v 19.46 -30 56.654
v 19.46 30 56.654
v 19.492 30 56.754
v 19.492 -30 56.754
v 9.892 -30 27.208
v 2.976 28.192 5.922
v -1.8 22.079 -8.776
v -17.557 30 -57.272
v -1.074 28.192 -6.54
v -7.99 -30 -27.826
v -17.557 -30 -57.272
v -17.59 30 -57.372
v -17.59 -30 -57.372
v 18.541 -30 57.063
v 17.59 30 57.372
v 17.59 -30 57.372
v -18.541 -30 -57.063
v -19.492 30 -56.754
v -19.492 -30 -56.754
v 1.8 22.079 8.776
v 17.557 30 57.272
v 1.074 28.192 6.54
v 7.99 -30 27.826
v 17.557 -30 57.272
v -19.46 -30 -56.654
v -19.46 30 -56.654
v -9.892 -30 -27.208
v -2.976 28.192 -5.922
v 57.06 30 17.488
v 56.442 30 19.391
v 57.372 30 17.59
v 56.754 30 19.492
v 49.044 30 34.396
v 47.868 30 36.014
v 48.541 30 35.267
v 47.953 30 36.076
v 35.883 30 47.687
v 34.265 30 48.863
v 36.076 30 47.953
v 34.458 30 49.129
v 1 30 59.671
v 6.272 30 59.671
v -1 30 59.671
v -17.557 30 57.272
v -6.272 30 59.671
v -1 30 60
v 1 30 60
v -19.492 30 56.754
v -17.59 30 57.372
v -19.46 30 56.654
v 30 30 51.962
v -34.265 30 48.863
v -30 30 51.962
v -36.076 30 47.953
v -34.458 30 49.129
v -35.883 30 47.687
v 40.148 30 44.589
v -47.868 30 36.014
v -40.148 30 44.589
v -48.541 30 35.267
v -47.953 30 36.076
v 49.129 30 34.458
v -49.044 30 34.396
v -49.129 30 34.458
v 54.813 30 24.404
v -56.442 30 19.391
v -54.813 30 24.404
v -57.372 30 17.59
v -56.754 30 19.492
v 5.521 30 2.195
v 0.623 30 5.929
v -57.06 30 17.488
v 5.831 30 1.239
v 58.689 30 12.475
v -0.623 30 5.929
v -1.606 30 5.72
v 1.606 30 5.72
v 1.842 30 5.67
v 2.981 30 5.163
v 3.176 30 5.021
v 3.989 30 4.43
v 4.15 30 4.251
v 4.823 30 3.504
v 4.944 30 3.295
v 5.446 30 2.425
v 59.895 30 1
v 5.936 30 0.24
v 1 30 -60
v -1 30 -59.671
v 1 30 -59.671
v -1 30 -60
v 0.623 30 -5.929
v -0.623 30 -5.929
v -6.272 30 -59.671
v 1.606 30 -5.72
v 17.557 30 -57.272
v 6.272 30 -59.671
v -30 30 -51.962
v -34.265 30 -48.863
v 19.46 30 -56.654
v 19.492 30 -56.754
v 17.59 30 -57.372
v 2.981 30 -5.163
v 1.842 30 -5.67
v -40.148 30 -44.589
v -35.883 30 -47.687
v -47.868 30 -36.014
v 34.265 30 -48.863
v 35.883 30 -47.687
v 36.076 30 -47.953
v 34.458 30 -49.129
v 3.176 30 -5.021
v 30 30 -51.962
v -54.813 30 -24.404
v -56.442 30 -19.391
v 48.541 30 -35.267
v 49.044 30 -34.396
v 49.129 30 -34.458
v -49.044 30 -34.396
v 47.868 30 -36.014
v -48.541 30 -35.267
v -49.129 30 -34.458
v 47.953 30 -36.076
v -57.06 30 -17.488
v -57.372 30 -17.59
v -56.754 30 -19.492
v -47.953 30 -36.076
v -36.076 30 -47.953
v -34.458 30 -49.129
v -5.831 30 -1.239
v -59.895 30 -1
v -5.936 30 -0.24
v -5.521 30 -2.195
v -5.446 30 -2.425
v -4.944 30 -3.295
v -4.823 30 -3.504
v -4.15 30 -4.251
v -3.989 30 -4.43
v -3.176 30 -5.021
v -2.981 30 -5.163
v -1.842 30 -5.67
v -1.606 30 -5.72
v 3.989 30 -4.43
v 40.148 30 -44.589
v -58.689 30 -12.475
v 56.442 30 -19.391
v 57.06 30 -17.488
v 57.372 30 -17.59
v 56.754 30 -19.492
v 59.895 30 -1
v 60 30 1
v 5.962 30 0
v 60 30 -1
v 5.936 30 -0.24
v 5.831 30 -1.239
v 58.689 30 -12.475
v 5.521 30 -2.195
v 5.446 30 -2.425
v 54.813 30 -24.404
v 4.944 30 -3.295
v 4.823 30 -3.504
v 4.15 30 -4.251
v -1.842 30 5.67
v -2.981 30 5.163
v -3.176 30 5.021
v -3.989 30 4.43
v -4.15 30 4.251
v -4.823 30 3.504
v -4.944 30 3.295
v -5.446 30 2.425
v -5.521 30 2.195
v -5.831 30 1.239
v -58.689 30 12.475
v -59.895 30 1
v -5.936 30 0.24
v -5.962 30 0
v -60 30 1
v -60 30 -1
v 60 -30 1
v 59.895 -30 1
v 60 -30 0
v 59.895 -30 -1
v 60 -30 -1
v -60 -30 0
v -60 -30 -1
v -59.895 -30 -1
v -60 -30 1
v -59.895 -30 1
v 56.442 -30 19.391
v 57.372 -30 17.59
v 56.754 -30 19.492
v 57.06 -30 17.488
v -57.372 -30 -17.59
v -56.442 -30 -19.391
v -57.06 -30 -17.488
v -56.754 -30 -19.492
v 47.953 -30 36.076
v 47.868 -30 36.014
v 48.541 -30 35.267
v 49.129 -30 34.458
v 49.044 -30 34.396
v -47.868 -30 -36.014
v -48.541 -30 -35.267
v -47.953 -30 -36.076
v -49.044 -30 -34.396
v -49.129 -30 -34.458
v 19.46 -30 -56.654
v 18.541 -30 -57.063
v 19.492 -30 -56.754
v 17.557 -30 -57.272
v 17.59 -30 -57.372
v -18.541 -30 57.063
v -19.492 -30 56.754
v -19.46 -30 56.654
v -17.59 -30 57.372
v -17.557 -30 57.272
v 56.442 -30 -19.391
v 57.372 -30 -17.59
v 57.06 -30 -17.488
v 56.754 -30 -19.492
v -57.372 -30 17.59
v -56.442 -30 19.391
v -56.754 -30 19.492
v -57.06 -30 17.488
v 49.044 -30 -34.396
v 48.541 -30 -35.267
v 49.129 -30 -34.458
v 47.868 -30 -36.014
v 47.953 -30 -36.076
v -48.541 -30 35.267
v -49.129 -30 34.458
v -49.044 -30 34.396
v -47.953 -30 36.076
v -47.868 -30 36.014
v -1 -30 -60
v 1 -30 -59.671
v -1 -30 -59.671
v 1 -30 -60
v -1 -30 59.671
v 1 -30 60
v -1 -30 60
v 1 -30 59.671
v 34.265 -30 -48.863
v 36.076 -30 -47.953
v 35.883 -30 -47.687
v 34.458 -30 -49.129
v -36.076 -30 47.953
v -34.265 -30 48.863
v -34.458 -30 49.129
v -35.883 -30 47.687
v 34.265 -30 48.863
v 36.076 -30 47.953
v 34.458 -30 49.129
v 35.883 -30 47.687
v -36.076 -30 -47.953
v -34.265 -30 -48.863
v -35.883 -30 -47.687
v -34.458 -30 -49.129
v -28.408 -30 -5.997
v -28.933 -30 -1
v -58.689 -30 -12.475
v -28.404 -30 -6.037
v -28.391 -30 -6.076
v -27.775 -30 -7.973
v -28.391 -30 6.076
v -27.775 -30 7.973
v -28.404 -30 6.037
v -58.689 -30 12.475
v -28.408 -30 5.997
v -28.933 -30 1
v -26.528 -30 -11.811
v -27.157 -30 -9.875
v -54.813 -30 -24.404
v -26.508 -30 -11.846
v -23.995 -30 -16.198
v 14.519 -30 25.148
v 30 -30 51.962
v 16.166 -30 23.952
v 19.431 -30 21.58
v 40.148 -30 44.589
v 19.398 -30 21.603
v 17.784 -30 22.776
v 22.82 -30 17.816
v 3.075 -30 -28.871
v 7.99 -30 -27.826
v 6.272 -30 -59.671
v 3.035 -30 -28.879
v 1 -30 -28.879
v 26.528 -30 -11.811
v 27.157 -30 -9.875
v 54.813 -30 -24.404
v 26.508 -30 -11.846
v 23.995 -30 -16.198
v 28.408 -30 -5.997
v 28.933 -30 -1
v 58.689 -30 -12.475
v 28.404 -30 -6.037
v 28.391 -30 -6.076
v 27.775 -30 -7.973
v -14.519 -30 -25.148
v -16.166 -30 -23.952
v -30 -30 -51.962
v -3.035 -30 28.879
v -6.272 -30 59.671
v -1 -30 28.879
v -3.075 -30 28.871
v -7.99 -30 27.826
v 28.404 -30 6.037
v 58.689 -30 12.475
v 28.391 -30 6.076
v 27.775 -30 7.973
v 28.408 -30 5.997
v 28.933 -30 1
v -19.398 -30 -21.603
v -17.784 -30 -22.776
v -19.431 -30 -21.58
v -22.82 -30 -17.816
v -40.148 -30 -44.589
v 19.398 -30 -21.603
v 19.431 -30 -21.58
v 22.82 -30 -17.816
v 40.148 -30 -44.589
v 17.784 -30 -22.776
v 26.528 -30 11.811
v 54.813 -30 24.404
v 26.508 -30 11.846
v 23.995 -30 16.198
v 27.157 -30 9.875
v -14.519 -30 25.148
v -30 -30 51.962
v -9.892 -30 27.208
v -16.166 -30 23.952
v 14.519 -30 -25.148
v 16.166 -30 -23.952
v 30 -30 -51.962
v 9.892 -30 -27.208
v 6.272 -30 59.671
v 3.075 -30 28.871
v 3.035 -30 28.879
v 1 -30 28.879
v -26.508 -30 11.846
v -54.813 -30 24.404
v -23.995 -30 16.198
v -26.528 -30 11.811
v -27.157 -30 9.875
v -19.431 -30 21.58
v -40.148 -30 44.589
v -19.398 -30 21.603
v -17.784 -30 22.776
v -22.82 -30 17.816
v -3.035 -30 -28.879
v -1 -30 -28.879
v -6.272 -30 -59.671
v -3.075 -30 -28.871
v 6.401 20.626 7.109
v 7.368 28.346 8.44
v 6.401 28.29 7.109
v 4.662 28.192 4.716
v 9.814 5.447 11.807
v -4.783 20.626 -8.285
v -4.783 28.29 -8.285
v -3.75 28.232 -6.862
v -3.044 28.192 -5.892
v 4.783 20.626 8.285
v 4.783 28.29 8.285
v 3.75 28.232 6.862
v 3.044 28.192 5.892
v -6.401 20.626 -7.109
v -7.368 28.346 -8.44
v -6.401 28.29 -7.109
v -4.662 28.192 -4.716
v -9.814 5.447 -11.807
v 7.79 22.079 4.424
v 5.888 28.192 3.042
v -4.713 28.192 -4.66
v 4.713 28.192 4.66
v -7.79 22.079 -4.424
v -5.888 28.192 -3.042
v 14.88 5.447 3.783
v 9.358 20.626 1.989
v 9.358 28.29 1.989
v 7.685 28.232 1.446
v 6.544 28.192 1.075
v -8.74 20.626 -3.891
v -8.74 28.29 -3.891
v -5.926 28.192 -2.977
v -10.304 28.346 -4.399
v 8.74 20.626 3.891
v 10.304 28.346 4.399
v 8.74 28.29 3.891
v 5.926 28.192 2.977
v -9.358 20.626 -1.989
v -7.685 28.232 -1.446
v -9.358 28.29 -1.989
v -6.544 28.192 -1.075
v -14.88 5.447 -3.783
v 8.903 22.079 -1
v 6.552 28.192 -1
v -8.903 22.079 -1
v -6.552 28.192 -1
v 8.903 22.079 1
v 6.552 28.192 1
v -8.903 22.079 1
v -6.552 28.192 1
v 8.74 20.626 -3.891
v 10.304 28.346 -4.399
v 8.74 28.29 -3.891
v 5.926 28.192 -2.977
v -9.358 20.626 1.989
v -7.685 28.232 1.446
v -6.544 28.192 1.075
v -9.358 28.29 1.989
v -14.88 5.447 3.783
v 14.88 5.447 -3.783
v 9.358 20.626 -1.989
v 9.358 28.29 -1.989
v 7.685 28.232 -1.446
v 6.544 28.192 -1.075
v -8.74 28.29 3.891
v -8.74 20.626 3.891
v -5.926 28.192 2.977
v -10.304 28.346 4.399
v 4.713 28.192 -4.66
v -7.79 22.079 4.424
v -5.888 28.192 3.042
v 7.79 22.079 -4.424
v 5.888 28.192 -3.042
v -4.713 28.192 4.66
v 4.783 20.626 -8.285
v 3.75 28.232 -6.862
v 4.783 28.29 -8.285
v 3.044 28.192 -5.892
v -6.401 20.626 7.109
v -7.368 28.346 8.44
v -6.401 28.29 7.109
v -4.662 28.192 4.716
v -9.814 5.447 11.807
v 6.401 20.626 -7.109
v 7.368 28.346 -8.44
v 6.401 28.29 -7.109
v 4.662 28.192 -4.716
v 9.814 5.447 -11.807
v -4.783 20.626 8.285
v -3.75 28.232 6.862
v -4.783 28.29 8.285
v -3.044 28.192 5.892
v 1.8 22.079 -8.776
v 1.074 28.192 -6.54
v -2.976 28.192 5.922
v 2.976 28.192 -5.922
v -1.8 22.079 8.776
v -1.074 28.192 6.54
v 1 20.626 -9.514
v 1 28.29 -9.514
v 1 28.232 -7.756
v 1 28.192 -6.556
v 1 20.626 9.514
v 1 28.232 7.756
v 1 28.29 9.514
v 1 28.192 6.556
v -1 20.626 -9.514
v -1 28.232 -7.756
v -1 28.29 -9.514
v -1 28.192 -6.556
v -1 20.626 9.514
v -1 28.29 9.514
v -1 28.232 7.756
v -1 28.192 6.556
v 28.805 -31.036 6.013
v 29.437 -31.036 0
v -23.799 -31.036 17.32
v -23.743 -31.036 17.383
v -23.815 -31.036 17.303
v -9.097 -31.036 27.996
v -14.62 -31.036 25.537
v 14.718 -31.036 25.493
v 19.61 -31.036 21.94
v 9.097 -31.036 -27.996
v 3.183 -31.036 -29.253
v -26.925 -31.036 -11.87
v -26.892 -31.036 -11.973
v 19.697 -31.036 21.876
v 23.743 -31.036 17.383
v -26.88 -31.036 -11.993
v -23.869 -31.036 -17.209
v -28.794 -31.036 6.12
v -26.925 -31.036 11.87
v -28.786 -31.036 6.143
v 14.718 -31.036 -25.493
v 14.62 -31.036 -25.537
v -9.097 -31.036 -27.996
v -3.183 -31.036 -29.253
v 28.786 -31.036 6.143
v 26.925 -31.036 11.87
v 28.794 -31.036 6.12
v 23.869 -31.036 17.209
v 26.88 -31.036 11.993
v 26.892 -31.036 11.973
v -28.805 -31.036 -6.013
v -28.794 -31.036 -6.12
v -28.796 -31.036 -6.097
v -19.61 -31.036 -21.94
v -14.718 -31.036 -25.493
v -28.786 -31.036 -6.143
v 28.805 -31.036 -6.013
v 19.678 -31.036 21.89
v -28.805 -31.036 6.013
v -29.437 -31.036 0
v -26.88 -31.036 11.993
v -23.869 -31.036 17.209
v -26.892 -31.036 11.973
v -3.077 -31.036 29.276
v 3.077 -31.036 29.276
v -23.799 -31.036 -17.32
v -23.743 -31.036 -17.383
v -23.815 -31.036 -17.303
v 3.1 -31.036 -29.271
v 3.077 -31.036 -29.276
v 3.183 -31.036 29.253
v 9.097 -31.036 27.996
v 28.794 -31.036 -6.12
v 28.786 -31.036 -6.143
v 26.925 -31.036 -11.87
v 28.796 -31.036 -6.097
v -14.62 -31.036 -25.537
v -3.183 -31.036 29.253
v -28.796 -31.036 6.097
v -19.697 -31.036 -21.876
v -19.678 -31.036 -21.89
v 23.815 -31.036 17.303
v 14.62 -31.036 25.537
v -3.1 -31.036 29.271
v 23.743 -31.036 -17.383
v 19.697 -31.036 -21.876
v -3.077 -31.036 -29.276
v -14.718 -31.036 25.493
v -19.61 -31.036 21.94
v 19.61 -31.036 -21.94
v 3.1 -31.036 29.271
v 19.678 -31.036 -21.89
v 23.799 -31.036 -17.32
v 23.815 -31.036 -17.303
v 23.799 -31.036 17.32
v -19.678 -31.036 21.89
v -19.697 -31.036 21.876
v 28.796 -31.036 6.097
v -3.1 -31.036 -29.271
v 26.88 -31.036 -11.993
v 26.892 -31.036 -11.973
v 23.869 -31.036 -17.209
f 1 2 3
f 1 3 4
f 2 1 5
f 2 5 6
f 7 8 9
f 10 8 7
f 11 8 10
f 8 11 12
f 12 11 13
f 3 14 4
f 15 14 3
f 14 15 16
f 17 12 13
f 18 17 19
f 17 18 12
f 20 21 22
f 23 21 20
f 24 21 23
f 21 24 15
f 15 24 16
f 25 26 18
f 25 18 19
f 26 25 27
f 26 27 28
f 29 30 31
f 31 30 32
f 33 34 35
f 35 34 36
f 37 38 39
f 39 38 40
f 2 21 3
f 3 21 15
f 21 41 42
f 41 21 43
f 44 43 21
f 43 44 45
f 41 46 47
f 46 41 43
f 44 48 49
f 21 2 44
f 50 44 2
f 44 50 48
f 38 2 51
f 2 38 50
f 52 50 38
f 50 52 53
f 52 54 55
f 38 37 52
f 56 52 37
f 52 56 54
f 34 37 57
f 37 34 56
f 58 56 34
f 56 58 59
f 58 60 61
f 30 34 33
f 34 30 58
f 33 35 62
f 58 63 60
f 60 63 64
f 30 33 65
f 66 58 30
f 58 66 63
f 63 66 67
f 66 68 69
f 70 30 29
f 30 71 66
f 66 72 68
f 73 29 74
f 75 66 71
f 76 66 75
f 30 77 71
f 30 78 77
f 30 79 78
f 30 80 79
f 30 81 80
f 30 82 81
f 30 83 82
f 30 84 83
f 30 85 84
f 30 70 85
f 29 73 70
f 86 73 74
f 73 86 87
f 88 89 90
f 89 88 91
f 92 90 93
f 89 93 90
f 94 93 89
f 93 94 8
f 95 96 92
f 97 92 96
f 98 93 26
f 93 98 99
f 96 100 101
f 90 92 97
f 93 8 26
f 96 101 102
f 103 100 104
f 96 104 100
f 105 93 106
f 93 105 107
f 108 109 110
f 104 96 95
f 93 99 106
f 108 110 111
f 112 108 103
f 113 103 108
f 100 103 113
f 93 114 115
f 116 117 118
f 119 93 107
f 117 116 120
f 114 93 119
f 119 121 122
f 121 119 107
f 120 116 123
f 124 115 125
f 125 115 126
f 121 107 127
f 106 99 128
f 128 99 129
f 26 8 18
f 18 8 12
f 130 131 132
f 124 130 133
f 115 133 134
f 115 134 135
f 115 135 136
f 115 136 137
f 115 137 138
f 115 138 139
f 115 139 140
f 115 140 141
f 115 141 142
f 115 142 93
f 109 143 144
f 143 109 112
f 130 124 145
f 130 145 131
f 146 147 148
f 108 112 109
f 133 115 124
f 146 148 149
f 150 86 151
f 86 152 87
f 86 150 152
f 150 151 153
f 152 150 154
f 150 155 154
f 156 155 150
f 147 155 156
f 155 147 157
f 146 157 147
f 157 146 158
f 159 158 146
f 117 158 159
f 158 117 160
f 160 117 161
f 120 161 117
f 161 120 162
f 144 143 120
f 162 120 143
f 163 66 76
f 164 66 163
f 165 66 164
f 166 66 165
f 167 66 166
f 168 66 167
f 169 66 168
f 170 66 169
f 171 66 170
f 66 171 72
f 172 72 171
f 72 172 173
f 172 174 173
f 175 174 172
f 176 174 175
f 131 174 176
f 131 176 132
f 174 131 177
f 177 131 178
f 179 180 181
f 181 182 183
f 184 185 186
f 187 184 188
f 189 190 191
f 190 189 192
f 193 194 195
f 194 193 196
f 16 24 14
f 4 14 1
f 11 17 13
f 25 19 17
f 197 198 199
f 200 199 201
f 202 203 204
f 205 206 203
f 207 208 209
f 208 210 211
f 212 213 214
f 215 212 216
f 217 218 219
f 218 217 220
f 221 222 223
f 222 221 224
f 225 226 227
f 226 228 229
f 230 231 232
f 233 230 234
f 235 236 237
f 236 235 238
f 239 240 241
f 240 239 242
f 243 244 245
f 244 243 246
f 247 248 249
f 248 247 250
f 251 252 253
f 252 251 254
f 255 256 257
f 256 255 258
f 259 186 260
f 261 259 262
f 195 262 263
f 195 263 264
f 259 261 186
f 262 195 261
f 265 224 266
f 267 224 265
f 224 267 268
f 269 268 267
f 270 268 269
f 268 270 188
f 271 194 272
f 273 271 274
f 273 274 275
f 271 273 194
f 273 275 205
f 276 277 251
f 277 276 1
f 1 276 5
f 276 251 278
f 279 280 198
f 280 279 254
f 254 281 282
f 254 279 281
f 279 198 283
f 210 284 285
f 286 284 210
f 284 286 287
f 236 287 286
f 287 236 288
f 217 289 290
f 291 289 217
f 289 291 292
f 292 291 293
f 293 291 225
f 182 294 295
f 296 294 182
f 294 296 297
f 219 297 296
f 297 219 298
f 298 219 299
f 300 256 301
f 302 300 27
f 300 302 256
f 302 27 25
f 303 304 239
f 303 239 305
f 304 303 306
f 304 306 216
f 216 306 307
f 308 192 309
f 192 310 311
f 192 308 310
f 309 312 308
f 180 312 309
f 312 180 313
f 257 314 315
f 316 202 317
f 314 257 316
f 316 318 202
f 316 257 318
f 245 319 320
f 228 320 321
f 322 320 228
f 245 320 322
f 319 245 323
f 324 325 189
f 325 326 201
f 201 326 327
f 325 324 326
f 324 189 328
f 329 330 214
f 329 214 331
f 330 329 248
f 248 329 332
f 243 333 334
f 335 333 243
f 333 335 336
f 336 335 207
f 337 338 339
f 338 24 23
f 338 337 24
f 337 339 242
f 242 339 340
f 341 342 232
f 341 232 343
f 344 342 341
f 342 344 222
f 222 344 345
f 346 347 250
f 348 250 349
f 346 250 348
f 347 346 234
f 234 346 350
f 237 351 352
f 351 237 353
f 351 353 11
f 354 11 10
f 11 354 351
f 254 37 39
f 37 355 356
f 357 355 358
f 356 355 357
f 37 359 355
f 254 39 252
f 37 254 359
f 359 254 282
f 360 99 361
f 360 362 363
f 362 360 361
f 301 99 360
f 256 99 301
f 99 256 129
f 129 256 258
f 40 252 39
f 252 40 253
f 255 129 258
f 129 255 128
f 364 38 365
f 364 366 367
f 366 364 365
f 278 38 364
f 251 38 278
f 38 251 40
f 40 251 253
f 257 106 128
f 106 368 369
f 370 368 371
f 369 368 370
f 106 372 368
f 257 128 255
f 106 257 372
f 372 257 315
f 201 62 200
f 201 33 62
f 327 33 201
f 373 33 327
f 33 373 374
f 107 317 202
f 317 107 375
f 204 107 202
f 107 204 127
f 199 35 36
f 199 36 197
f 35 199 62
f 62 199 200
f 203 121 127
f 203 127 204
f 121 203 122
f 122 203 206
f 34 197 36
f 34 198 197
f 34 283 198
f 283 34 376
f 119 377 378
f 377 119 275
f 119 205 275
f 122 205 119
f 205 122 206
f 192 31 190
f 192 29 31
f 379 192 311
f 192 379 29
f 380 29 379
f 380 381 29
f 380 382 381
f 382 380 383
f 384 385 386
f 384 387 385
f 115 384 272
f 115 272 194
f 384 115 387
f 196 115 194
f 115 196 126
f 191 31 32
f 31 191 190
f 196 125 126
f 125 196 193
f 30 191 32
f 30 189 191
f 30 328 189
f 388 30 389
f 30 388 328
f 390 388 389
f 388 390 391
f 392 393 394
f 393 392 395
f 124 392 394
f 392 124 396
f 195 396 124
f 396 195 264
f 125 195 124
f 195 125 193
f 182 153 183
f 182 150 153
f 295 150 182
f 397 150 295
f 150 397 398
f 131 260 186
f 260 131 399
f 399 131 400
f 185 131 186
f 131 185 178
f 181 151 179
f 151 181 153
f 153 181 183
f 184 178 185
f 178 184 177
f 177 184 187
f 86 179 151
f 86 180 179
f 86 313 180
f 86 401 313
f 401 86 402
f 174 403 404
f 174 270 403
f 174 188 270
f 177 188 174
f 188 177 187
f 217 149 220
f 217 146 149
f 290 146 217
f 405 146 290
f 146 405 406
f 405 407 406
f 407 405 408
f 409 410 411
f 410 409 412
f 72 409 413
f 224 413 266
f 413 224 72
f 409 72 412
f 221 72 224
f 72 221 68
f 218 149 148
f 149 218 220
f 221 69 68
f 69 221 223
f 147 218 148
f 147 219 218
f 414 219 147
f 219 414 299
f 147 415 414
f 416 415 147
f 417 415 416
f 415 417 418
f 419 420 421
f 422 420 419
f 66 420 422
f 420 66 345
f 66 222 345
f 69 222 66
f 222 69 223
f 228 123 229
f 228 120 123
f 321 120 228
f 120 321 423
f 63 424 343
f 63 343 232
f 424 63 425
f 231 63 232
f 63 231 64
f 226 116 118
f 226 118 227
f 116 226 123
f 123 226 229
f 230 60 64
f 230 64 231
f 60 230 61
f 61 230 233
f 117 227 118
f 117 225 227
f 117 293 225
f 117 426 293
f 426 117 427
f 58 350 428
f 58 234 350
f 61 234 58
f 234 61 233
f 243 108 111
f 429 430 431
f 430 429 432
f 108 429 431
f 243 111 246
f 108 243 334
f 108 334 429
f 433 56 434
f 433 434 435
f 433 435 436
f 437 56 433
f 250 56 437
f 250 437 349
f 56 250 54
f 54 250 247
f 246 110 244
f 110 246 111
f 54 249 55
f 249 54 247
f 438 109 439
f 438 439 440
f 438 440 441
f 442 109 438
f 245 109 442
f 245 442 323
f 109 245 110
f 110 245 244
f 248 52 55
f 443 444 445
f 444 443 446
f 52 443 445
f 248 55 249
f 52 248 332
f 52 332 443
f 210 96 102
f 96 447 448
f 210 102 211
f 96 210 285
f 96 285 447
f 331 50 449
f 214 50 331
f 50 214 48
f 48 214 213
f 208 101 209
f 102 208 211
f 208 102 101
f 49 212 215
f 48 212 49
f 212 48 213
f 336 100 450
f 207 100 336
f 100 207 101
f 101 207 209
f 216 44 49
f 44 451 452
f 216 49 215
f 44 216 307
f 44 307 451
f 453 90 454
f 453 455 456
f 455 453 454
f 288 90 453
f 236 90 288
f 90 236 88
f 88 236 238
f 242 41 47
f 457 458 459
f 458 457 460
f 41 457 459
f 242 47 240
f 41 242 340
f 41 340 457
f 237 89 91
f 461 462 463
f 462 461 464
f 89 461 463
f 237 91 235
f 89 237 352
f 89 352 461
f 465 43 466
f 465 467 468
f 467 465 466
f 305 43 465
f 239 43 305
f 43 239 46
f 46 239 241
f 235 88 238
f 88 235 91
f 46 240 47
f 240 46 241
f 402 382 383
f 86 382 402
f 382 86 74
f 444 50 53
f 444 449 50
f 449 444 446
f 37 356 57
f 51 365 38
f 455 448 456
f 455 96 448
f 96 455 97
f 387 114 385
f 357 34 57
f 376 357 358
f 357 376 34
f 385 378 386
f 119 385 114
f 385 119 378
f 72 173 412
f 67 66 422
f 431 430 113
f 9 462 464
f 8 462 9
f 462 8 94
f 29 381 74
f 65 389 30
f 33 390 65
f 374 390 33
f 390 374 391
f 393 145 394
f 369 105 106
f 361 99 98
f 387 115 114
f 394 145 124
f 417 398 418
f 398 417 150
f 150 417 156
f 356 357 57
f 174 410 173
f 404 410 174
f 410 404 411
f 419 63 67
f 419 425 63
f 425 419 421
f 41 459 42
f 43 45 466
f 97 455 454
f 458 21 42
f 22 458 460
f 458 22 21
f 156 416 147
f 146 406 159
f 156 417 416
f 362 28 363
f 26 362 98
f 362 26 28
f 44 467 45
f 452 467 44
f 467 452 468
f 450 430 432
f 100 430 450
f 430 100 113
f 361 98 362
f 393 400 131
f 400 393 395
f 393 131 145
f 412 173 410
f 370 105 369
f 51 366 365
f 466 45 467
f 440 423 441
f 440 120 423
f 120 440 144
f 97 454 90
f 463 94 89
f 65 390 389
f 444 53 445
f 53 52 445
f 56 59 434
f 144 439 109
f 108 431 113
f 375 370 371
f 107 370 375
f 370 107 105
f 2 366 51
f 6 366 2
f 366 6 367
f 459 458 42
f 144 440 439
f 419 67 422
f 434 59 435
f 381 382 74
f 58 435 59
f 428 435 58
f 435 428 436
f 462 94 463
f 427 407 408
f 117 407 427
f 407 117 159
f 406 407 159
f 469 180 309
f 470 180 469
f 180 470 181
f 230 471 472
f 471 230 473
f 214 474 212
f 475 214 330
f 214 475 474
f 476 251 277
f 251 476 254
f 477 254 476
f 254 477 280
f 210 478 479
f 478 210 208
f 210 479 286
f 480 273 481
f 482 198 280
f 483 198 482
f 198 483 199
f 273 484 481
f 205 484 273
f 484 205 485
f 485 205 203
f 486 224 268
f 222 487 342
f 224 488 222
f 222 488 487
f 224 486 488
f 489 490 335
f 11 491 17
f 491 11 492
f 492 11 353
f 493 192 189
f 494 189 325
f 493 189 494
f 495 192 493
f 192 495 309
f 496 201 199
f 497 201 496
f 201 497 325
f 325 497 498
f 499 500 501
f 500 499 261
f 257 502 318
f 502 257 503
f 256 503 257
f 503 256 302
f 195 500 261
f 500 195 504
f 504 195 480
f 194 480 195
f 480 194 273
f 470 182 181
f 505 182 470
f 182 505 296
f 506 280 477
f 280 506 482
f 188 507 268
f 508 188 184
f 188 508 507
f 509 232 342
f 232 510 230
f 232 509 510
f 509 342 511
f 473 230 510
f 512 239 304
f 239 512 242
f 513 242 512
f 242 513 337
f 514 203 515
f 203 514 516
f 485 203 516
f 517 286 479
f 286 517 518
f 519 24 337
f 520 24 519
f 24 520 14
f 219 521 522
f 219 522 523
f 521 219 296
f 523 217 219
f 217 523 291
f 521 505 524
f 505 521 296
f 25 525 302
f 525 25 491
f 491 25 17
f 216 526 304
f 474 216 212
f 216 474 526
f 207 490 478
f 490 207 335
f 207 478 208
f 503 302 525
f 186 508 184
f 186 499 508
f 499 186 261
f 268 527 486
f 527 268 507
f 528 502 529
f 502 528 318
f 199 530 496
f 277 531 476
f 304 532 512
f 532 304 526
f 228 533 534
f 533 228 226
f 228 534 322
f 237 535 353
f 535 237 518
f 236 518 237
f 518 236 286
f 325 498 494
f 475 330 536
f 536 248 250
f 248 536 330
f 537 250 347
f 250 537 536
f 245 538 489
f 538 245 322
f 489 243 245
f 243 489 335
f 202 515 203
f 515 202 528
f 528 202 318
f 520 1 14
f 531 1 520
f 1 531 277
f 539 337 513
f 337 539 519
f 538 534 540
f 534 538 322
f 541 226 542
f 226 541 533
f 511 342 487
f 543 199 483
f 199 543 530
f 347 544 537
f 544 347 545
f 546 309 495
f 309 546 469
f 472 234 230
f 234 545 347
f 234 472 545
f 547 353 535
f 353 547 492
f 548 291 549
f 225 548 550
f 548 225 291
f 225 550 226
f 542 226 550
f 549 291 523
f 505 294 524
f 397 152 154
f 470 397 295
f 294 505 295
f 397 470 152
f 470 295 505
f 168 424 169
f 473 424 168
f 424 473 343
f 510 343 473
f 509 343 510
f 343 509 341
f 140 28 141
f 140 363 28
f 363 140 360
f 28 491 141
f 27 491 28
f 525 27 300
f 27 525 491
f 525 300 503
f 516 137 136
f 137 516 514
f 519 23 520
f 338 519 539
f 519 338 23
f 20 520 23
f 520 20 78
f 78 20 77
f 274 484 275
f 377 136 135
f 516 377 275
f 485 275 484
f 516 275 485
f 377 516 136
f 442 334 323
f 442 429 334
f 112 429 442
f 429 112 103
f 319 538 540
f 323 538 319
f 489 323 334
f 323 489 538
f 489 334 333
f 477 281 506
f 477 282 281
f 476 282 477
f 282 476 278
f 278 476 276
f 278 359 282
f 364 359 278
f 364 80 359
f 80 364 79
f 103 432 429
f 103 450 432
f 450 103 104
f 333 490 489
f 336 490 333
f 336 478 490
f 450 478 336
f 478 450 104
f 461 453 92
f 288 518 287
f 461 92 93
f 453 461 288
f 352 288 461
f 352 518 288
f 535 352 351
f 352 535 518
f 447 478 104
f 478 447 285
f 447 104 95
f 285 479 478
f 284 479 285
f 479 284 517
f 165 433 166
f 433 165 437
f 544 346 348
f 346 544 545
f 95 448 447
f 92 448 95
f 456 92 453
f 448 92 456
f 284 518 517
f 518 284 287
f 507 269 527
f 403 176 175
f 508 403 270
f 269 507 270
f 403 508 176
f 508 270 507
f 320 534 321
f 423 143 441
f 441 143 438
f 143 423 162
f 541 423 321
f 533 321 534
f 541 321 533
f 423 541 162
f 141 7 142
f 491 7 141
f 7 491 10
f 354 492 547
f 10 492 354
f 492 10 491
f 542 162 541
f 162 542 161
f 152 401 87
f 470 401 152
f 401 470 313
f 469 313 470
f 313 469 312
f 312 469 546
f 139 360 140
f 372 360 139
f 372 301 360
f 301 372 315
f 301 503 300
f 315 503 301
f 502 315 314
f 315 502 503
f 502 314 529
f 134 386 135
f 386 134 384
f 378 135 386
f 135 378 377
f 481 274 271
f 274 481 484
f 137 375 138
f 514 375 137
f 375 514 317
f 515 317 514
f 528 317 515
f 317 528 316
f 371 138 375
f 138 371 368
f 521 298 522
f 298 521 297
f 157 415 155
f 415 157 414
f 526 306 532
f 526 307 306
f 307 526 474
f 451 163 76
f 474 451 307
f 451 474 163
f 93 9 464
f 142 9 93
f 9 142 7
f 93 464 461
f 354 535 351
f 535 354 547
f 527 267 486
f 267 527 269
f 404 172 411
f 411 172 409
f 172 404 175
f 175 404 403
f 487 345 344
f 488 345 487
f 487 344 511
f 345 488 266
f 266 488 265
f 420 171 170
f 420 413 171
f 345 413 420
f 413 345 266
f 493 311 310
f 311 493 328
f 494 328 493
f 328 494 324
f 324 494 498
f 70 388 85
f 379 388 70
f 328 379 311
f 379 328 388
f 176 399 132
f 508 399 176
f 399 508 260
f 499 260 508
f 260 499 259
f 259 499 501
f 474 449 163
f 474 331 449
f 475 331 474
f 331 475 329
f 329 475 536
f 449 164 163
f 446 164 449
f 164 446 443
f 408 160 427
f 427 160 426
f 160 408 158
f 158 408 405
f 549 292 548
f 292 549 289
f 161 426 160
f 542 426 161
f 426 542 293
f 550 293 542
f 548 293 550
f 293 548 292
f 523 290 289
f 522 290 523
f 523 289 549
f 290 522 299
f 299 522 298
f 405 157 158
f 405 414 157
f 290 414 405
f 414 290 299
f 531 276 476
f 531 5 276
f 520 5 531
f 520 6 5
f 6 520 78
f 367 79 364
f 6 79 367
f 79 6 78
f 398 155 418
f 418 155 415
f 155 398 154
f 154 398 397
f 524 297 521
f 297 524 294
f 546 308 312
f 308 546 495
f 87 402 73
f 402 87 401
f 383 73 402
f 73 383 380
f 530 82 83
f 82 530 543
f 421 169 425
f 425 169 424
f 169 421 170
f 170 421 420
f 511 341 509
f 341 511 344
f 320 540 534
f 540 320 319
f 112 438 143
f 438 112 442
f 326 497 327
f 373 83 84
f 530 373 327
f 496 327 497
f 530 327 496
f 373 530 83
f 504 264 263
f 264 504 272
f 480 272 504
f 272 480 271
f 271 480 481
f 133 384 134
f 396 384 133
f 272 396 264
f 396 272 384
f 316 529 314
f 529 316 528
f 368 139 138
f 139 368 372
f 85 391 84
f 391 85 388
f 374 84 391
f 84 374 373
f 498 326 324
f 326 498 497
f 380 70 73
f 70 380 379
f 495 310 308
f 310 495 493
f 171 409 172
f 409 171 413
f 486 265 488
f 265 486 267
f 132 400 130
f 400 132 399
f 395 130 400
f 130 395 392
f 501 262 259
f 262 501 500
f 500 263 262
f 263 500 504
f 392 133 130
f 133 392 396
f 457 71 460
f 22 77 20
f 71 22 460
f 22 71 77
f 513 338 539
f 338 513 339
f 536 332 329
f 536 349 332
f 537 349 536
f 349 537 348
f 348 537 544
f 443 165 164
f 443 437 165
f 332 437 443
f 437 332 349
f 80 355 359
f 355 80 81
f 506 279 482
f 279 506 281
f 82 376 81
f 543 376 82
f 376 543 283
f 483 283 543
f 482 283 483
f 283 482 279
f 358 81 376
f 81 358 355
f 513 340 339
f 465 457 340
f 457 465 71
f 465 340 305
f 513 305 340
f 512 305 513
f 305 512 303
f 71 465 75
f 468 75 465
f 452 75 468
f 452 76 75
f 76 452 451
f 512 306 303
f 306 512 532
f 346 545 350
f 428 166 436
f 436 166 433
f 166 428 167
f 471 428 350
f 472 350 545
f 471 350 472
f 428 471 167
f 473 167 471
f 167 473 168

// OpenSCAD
paddle_planes = 10;
turbine_length = 60;
turbine_radius = 60;
turbine_diameter = turbine_radius * 2;
rotation = 180 / paddle_planes;
spindle_radius = 5;
jet_radius = turbine_radius / 2;
sheet_thickness = 2;

difference() {
    union() {
        // paddles
        for (i = [rotation:rotation:paddle_planes * rotation])
            rotate([0, i, 0])
                cube([sheet_thickness, turbine_length, turbine_diameter], center=true);
        
        // end plates
        translate([0, turbine_length / 2, 0])
        rotate([90, 0, 0])
        cylinder(sheet_thickness, turbine_radius, center=false);
        translate([0, -turbine_length / 2, 0])
        rotate([90, 0, 0])
        cylinder(sheet_thickness, turbine_radius, center=false);
    }
    // remove inner cone
    rotate([-90, 0, 0])
    cylinder(turbine_length + 5, jet_radius, spindle_radius, center=true);
}
